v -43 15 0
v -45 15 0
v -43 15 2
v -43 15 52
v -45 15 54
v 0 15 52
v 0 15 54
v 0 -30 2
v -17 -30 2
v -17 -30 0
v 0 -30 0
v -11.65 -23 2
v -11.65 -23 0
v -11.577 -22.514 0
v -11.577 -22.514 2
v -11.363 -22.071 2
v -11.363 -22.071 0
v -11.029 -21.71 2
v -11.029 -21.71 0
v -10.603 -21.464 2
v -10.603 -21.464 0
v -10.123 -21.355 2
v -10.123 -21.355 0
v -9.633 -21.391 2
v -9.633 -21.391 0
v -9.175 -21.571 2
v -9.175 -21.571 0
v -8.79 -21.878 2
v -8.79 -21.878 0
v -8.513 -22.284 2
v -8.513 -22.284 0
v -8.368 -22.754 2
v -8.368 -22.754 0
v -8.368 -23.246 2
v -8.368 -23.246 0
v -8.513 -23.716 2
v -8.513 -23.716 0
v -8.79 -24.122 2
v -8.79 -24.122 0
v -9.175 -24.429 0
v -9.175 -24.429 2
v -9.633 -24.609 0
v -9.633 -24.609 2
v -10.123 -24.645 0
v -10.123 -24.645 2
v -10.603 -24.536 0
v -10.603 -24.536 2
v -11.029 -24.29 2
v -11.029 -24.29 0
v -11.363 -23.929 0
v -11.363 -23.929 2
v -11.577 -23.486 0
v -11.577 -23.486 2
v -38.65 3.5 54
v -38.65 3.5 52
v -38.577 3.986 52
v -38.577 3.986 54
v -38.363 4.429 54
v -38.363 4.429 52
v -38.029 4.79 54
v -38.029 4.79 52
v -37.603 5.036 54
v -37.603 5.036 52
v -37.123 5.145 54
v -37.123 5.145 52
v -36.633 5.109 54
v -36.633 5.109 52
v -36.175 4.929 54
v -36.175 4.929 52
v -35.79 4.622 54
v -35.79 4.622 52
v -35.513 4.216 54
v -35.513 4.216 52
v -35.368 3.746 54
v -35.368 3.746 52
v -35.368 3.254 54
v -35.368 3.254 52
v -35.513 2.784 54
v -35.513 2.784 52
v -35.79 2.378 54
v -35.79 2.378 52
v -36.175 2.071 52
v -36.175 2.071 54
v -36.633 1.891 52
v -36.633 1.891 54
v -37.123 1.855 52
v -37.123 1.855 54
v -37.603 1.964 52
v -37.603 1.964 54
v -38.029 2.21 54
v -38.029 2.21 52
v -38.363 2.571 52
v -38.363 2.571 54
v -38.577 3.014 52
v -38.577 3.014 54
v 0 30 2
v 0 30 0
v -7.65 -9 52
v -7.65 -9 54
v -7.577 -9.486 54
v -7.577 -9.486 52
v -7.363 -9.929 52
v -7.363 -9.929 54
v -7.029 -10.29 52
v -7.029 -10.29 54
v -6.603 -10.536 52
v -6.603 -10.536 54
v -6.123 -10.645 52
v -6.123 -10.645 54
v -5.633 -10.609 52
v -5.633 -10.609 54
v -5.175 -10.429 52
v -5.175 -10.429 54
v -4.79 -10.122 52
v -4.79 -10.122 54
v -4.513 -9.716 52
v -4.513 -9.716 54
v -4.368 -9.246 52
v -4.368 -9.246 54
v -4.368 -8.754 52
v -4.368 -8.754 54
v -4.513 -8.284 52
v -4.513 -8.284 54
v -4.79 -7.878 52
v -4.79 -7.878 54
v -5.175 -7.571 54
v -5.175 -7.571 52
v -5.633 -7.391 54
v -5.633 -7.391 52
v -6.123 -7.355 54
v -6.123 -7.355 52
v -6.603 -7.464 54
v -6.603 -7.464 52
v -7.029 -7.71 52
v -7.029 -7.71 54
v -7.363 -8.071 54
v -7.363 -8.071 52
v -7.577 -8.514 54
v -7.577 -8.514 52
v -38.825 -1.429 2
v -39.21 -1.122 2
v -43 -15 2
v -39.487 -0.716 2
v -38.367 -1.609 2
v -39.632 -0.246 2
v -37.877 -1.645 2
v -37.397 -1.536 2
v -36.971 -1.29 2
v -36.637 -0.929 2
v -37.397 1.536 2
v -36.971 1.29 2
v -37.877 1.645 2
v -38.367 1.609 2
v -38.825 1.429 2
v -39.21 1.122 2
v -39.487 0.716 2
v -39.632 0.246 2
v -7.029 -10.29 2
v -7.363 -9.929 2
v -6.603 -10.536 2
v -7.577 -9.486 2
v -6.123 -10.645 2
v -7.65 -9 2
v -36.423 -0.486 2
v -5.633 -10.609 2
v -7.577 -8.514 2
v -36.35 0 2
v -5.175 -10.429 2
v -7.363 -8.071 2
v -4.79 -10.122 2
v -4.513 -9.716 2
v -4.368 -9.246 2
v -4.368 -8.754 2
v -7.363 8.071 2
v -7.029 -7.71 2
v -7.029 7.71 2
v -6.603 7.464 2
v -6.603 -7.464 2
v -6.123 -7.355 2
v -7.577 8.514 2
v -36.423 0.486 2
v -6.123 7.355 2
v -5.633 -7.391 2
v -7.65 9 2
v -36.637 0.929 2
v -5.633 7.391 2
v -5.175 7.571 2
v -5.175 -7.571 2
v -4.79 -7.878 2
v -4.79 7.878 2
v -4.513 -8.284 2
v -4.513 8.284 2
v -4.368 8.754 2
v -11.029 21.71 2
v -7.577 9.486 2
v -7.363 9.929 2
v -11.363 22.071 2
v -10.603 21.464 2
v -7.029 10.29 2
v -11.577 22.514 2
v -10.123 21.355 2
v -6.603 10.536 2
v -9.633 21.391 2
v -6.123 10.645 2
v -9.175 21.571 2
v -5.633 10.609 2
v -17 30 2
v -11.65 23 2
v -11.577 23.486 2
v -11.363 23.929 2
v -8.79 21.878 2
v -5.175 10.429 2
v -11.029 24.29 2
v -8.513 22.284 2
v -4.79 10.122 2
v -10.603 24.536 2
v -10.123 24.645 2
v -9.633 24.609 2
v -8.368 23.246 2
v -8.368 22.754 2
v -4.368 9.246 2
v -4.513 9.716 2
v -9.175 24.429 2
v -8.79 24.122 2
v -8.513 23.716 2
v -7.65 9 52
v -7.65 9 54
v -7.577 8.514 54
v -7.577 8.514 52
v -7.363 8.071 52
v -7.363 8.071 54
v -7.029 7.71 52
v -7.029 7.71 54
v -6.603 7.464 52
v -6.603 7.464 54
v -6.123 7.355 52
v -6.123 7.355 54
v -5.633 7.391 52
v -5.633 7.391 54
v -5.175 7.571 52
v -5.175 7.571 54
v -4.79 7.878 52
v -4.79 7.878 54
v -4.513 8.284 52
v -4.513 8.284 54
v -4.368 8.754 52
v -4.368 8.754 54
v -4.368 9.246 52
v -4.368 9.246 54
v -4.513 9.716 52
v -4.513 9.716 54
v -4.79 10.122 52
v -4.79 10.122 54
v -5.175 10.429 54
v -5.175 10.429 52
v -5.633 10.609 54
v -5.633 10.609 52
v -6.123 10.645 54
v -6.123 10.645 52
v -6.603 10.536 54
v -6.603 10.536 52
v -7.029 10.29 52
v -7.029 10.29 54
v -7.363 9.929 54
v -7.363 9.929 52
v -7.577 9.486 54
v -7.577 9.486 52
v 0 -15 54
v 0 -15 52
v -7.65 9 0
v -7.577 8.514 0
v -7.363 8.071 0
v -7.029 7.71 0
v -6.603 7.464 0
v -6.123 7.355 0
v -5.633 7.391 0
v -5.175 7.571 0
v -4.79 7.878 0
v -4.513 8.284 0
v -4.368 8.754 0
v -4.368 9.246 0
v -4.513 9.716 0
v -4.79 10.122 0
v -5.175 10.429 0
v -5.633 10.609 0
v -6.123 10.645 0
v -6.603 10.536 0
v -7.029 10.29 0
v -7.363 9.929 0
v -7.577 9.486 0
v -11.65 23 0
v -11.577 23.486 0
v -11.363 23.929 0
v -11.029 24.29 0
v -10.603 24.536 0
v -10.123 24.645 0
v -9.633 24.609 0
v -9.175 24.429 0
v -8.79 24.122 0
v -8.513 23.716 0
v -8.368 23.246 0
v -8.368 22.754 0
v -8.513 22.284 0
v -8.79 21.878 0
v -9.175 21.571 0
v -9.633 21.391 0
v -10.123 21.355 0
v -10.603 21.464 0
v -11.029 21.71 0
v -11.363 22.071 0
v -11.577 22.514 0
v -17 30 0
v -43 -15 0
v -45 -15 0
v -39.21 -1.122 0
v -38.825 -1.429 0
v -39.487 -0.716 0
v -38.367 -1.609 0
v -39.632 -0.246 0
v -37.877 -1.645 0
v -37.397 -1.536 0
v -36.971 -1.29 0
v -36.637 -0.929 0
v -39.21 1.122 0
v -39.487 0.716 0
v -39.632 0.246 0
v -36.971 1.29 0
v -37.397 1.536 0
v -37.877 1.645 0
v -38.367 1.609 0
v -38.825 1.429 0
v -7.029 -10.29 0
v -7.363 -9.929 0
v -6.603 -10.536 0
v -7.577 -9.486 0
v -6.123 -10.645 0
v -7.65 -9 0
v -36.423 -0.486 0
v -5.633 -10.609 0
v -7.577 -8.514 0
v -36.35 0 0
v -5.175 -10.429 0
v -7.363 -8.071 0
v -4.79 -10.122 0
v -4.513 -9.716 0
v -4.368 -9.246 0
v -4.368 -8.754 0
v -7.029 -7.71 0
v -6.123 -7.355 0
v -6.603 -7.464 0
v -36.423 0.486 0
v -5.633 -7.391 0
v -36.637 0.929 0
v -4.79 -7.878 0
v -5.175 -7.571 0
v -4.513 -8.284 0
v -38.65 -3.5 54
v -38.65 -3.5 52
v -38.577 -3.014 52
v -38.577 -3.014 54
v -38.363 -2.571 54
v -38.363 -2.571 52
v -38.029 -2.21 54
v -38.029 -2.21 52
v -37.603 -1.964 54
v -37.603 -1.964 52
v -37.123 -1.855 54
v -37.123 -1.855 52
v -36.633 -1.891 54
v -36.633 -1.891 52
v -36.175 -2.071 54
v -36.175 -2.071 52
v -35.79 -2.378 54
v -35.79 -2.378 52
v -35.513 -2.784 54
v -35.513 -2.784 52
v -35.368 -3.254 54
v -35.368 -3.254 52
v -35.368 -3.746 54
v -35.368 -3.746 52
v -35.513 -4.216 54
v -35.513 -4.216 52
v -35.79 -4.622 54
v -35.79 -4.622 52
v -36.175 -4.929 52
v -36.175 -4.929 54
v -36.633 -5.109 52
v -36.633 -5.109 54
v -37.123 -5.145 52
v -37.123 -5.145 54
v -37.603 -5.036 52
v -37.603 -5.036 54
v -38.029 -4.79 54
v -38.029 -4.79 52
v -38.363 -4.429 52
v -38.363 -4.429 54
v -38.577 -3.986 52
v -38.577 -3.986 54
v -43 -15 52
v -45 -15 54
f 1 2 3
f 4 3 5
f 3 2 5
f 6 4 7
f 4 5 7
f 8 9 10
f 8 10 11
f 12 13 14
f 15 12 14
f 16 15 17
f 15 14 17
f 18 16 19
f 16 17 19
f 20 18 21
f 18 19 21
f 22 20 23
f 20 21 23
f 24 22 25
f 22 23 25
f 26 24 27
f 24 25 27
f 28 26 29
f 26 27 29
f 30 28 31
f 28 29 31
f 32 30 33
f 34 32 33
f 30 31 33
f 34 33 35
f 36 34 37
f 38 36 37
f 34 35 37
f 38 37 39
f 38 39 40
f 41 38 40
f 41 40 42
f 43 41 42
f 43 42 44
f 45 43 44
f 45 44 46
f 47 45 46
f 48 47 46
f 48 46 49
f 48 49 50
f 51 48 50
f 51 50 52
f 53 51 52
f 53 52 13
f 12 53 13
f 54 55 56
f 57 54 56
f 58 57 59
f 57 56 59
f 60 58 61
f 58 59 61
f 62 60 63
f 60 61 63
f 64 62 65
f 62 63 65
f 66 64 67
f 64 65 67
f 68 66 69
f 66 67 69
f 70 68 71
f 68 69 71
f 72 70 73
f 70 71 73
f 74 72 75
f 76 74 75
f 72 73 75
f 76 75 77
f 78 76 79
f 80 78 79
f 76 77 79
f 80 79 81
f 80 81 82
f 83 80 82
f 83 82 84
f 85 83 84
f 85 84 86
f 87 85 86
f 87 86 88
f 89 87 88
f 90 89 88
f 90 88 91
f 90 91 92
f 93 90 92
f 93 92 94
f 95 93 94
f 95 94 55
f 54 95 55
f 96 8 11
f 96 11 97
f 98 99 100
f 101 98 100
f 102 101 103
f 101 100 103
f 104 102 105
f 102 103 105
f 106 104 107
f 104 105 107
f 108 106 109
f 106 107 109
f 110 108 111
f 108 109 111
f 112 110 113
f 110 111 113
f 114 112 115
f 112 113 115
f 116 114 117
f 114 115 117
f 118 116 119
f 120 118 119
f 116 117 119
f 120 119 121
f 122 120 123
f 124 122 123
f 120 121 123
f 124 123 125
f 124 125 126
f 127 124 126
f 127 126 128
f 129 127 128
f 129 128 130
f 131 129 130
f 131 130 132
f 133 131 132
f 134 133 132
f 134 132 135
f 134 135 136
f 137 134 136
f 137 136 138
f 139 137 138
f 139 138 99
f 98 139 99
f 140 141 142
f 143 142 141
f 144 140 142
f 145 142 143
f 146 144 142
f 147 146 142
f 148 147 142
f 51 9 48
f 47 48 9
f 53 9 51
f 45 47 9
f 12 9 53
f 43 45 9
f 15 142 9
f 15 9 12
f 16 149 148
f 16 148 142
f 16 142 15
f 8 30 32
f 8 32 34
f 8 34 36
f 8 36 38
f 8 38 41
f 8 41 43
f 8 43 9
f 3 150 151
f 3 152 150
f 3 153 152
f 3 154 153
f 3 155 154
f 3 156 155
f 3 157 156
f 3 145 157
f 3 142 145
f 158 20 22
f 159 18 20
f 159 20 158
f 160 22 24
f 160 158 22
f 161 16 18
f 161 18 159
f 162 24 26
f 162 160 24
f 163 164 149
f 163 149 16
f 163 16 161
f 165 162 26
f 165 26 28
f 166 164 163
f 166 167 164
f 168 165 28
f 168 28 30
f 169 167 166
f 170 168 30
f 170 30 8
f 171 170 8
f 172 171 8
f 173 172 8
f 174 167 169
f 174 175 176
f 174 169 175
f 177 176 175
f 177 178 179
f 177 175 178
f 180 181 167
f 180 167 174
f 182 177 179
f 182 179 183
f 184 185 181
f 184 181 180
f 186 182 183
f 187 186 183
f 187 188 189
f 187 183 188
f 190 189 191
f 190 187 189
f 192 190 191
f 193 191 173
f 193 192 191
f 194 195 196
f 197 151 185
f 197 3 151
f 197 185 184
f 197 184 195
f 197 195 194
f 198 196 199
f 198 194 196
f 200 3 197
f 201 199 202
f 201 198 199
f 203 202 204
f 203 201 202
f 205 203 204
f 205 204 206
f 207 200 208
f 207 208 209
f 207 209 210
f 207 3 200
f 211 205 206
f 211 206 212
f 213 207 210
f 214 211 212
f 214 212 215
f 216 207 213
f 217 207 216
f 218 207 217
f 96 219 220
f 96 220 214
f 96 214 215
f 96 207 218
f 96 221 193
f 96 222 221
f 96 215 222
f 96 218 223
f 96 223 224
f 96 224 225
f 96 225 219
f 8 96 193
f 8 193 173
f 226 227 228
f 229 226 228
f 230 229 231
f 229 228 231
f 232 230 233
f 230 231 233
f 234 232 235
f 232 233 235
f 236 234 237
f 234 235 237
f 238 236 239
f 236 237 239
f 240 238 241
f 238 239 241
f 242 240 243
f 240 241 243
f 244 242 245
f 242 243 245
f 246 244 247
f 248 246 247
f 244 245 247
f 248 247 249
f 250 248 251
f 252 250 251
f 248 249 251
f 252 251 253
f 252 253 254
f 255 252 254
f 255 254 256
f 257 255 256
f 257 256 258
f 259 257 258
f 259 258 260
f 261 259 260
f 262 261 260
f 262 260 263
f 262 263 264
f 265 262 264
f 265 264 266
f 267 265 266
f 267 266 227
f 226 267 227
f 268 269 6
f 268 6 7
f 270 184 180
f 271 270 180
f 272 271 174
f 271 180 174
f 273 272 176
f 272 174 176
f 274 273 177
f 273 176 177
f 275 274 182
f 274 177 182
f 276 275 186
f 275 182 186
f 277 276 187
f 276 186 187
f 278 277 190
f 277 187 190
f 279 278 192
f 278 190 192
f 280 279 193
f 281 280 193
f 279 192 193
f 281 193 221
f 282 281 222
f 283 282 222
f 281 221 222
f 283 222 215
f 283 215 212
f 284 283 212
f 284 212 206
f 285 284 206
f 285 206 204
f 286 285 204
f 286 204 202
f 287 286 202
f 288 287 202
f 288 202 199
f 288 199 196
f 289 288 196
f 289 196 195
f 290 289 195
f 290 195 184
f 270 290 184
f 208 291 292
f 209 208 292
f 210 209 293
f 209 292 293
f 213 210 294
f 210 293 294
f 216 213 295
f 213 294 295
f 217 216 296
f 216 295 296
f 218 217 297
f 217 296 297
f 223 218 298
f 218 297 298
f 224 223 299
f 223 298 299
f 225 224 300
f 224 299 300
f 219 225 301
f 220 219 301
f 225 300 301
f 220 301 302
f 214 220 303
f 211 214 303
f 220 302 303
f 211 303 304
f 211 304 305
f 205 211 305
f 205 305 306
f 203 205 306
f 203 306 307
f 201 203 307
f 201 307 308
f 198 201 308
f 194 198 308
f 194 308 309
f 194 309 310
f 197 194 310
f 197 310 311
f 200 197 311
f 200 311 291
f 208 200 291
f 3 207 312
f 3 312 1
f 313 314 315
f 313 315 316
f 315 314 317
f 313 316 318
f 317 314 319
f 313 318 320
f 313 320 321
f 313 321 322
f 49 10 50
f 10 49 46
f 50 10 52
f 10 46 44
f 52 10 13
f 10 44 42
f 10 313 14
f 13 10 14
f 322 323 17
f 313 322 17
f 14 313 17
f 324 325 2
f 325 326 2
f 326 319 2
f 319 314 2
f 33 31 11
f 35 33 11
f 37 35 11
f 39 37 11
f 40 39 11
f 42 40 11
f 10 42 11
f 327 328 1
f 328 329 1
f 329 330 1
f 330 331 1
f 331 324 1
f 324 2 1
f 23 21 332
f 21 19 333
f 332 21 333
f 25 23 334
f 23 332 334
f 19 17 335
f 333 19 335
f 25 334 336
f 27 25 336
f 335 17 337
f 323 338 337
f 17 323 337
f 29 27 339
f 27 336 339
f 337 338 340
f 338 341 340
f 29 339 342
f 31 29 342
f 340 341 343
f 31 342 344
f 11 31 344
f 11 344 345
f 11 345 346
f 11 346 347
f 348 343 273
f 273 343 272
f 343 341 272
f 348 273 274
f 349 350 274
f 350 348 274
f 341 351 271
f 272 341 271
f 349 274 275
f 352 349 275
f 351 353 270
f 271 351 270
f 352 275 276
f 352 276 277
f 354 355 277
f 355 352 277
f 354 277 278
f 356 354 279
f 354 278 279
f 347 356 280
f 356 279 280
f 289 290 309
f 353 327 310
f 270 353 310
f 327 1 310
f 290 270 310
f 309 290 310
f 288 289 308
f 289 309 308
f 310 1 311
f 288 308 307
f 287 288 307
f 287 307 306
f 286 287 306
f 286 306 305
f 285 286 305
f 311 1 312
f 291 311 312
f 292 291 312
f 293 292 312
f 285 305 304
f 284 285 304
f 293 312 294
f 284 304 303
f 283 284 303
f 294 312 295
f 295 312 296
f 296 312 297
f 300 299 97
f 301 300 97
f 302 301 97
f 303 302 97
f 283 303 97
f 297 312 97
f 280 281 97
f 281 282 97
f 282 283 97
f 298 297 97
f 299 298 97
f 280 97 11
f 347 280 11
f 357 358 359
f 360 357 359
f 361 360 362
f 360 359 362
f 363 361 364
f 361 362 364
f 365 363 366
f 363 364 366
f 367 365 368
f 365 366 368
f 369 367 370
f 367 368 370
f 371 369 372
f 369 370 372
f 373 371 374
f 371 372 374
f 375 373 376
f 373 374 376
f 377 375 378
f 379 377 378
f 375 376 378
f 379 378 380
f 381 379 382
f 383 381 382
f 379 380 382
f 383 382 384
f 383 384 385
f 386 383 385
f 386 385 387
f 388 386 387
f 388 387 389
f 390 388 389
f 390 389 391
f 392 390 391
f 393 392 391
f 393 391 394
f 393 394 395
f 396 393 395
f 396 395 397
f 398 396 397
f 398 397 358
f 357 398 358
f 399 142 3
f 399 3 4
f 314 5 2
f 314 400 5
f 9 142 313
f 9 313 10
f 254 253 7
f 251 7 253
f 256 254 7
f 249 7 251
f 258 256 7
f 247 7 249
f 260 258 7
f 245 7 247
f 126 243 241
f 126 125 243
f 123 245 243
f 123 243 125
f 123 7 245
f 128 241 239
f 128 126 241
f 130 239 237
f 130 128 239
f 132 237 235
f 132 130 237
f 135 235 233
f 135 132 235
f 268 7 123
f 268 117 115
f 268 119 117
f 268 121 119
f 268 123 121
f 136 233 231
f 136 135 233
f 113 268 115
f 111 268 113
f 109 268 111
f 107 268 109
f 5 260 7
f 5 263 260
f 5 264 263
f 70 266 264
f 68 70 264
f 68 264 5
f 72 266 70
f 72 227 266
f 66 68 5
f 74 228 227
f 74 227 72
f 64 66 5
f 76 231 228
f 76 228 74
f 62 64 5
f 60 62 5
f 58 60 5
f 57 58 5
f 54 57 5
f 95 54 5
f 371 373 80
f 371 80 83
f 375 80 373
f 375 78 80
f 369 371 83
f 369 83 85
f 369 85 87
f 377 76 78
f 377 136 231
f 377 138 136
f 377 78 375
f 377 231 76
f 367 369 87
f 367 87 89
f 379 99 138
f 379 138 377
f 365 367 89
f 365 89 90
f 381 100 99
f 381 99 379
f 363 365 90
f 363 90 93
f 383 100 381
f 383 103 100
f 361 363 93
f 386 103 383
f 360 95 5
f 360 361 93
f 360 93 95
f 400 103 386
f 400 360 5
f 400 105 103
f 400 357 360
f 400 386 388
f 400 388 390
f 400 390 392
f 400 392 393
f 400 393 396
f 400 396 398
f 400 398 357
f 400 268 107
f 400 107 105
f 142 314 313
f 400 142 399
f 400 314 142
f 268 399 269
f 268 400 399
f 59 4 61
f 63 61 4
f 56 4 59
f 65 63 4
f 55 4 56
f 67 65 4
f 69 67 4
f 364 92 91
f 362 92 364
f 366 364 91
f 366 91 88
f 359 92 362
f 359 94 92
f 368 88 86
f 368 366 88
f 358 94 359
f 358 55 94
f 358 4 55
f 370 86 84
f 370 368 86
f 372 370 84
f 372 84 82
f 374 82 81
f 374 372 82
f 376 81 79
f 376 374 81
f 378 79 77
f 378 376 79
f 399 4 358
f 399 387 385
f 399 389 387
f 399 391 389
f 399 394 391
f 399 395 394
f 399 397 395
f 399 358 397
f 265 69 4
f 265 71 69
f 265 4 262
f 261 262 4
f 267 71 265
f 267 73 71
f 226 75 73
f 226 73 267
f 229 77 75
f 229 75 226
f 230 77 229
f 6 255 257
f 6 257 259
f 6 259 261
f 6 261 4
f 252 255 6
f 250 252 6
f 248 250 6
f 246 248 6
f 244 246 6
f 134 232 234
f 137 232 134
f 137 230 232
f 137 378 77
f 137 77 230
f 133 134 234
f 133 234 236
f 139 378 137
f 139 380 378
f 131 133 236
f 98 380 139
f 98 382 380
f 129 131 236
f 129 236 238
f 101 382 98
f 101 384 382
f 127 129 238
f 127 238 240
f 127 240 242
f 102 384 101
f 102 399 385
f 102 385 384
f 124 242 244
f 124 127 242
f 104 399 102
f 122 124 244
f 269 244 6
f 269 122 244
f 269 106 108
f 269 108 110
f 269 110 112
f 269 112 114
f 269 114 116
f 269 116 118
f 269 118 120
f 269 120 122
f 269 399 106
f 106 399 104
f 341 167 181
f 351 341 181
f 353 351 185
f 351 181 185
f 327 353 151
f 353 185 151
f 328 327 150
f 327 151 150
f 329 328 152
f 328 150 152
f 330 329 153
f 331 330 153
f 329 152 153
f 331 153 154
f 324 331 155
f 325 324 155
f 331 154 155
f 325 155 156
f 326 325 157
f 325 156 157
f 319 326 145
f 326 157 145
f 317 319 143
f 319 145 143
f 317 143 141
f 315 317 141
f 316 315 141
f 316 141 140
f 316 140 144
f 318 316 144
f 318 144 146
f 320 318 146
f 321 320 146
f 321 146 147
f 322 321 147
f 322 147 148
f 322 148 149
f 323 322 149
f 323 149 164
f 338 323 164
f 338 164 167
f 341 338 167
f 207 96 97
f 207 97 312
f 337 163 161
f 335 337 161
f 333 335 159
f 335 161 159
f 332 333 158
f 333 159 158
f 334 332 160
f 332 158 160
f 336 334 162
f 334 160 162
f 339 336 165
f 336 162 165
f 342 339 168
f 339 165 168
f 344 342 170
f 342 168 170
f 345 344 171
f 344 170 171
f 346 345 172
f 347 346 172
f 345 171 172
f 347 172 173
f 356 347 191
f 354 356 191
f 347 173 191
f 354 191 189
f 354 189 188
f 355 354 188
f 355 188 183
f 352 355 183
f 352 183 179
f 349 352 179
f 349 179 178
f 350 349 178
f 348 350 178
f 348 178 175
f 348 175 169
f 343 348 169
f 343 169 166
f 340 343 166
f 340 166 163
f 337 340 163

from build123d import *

# Parameters (mm, degrees)
F1_DEPTH  = 15
F3_D      = 3.3
F5_D      = 3.3
F5_DEPTH  = 13.5
F5_TIP    = 0.9914200214
F7_D      = 3.3
F7_DEPTH  = 13.5
F7_TIP    = 0.9914200214
F9_DEPTH  = 2
F12_D     = 3.3
F12_DEPTH = 13.5
F12_TIP   = 0.9914200214


with BuildPart() as f1:
    # F0 (on Front) → F1 (new body, symmetric)
    with BuildSketch(Plane.XZ):
        Polygon((-45, 0), (0, 0), (0, 2), (-43, 2), (-43, 52), (0, 52), (0, 54), (-45, 54), align=None)
    extrude(amount=F1_DEPTH, both=True)

    # F3 (through all)
    with Locations(Plane(origin=(0, 0, 0), x_dir=(1, 0, 0), z_dir=(0, 0, -1))):
        with Locations((-6, 9), (-6, -9)):
            Hole(F3_D / 2)

    # F5
    with Locations(Plane.XY.offset(54)):
        with Locations((-37, 3.5), (-37, -3.5)):
            Hole(F5_D / 2, depth=F5_DEPTH)
            with Locations((0, 0, -(F5_DEPTH + F5_TIP / 2))):  # 118° drill point
                Cone(0, F5_D / 2, F5_TIP, mode=Mode.SUBTRACT)

    # F7 (one way)
    with BuildSketch(Plane.XY.offset(2)):
        with Locations((-37.9999987781, 0)):
            Circle(F7_D / 2)
    extrude(amount=-F7_DEPTH, mode=Mode.SUBTRACT)
    with Locations(Plane.XY.offset(2)):
        with Locations((-37.9999987781, 0)):
            with Locations((0, 0, -(F7_DEPTH + F7_TIP / 2))):  # 118° drill point
                Cone(0, F7_D / 2, F7_TIP, mode=Mode.SUBTRACT)


with BuildPart() as f9:
    # F8 (on face) → F9 (new body)
    with BuildSketch(Plane.XY.offset(2)):
        Polygon((0, -30), (0, -15), (-43, -15), (-17, -30), align=None)
    extrude(amount=-F9_DEPTH)


with BuildPart() as f9b:
    # F8 (on face) → F9, piece 2 (new body)
    with BuildSketch(Plane.XY.offset(2)):
        Polygon((-17, 30), (-43, 15), (0, 15), (0, 30), align=None)
    extrude(amount=-F9_DEPTH)


with BuildPart() as f1_1:
    add(f1.part)

    # F10: union F9, F9b
    add(f9.part)
    add(f9b.part)

    # F12
    with Locations(Plane.XY.offset(2)):
        with Locations((-9.9999987781, 23), (-9.9999987781, -23)):
            Hole(F12_D / 2, depth=F12_DEPTH)
            with Locations((0, 0, -(F12_DEPTH + F12_TIP / 2))):  # 118° drill point
                Cone(0, F12_D / 2, F12_TIP, mode=Mode.SUBTRACT)


solid = f1_1.part
